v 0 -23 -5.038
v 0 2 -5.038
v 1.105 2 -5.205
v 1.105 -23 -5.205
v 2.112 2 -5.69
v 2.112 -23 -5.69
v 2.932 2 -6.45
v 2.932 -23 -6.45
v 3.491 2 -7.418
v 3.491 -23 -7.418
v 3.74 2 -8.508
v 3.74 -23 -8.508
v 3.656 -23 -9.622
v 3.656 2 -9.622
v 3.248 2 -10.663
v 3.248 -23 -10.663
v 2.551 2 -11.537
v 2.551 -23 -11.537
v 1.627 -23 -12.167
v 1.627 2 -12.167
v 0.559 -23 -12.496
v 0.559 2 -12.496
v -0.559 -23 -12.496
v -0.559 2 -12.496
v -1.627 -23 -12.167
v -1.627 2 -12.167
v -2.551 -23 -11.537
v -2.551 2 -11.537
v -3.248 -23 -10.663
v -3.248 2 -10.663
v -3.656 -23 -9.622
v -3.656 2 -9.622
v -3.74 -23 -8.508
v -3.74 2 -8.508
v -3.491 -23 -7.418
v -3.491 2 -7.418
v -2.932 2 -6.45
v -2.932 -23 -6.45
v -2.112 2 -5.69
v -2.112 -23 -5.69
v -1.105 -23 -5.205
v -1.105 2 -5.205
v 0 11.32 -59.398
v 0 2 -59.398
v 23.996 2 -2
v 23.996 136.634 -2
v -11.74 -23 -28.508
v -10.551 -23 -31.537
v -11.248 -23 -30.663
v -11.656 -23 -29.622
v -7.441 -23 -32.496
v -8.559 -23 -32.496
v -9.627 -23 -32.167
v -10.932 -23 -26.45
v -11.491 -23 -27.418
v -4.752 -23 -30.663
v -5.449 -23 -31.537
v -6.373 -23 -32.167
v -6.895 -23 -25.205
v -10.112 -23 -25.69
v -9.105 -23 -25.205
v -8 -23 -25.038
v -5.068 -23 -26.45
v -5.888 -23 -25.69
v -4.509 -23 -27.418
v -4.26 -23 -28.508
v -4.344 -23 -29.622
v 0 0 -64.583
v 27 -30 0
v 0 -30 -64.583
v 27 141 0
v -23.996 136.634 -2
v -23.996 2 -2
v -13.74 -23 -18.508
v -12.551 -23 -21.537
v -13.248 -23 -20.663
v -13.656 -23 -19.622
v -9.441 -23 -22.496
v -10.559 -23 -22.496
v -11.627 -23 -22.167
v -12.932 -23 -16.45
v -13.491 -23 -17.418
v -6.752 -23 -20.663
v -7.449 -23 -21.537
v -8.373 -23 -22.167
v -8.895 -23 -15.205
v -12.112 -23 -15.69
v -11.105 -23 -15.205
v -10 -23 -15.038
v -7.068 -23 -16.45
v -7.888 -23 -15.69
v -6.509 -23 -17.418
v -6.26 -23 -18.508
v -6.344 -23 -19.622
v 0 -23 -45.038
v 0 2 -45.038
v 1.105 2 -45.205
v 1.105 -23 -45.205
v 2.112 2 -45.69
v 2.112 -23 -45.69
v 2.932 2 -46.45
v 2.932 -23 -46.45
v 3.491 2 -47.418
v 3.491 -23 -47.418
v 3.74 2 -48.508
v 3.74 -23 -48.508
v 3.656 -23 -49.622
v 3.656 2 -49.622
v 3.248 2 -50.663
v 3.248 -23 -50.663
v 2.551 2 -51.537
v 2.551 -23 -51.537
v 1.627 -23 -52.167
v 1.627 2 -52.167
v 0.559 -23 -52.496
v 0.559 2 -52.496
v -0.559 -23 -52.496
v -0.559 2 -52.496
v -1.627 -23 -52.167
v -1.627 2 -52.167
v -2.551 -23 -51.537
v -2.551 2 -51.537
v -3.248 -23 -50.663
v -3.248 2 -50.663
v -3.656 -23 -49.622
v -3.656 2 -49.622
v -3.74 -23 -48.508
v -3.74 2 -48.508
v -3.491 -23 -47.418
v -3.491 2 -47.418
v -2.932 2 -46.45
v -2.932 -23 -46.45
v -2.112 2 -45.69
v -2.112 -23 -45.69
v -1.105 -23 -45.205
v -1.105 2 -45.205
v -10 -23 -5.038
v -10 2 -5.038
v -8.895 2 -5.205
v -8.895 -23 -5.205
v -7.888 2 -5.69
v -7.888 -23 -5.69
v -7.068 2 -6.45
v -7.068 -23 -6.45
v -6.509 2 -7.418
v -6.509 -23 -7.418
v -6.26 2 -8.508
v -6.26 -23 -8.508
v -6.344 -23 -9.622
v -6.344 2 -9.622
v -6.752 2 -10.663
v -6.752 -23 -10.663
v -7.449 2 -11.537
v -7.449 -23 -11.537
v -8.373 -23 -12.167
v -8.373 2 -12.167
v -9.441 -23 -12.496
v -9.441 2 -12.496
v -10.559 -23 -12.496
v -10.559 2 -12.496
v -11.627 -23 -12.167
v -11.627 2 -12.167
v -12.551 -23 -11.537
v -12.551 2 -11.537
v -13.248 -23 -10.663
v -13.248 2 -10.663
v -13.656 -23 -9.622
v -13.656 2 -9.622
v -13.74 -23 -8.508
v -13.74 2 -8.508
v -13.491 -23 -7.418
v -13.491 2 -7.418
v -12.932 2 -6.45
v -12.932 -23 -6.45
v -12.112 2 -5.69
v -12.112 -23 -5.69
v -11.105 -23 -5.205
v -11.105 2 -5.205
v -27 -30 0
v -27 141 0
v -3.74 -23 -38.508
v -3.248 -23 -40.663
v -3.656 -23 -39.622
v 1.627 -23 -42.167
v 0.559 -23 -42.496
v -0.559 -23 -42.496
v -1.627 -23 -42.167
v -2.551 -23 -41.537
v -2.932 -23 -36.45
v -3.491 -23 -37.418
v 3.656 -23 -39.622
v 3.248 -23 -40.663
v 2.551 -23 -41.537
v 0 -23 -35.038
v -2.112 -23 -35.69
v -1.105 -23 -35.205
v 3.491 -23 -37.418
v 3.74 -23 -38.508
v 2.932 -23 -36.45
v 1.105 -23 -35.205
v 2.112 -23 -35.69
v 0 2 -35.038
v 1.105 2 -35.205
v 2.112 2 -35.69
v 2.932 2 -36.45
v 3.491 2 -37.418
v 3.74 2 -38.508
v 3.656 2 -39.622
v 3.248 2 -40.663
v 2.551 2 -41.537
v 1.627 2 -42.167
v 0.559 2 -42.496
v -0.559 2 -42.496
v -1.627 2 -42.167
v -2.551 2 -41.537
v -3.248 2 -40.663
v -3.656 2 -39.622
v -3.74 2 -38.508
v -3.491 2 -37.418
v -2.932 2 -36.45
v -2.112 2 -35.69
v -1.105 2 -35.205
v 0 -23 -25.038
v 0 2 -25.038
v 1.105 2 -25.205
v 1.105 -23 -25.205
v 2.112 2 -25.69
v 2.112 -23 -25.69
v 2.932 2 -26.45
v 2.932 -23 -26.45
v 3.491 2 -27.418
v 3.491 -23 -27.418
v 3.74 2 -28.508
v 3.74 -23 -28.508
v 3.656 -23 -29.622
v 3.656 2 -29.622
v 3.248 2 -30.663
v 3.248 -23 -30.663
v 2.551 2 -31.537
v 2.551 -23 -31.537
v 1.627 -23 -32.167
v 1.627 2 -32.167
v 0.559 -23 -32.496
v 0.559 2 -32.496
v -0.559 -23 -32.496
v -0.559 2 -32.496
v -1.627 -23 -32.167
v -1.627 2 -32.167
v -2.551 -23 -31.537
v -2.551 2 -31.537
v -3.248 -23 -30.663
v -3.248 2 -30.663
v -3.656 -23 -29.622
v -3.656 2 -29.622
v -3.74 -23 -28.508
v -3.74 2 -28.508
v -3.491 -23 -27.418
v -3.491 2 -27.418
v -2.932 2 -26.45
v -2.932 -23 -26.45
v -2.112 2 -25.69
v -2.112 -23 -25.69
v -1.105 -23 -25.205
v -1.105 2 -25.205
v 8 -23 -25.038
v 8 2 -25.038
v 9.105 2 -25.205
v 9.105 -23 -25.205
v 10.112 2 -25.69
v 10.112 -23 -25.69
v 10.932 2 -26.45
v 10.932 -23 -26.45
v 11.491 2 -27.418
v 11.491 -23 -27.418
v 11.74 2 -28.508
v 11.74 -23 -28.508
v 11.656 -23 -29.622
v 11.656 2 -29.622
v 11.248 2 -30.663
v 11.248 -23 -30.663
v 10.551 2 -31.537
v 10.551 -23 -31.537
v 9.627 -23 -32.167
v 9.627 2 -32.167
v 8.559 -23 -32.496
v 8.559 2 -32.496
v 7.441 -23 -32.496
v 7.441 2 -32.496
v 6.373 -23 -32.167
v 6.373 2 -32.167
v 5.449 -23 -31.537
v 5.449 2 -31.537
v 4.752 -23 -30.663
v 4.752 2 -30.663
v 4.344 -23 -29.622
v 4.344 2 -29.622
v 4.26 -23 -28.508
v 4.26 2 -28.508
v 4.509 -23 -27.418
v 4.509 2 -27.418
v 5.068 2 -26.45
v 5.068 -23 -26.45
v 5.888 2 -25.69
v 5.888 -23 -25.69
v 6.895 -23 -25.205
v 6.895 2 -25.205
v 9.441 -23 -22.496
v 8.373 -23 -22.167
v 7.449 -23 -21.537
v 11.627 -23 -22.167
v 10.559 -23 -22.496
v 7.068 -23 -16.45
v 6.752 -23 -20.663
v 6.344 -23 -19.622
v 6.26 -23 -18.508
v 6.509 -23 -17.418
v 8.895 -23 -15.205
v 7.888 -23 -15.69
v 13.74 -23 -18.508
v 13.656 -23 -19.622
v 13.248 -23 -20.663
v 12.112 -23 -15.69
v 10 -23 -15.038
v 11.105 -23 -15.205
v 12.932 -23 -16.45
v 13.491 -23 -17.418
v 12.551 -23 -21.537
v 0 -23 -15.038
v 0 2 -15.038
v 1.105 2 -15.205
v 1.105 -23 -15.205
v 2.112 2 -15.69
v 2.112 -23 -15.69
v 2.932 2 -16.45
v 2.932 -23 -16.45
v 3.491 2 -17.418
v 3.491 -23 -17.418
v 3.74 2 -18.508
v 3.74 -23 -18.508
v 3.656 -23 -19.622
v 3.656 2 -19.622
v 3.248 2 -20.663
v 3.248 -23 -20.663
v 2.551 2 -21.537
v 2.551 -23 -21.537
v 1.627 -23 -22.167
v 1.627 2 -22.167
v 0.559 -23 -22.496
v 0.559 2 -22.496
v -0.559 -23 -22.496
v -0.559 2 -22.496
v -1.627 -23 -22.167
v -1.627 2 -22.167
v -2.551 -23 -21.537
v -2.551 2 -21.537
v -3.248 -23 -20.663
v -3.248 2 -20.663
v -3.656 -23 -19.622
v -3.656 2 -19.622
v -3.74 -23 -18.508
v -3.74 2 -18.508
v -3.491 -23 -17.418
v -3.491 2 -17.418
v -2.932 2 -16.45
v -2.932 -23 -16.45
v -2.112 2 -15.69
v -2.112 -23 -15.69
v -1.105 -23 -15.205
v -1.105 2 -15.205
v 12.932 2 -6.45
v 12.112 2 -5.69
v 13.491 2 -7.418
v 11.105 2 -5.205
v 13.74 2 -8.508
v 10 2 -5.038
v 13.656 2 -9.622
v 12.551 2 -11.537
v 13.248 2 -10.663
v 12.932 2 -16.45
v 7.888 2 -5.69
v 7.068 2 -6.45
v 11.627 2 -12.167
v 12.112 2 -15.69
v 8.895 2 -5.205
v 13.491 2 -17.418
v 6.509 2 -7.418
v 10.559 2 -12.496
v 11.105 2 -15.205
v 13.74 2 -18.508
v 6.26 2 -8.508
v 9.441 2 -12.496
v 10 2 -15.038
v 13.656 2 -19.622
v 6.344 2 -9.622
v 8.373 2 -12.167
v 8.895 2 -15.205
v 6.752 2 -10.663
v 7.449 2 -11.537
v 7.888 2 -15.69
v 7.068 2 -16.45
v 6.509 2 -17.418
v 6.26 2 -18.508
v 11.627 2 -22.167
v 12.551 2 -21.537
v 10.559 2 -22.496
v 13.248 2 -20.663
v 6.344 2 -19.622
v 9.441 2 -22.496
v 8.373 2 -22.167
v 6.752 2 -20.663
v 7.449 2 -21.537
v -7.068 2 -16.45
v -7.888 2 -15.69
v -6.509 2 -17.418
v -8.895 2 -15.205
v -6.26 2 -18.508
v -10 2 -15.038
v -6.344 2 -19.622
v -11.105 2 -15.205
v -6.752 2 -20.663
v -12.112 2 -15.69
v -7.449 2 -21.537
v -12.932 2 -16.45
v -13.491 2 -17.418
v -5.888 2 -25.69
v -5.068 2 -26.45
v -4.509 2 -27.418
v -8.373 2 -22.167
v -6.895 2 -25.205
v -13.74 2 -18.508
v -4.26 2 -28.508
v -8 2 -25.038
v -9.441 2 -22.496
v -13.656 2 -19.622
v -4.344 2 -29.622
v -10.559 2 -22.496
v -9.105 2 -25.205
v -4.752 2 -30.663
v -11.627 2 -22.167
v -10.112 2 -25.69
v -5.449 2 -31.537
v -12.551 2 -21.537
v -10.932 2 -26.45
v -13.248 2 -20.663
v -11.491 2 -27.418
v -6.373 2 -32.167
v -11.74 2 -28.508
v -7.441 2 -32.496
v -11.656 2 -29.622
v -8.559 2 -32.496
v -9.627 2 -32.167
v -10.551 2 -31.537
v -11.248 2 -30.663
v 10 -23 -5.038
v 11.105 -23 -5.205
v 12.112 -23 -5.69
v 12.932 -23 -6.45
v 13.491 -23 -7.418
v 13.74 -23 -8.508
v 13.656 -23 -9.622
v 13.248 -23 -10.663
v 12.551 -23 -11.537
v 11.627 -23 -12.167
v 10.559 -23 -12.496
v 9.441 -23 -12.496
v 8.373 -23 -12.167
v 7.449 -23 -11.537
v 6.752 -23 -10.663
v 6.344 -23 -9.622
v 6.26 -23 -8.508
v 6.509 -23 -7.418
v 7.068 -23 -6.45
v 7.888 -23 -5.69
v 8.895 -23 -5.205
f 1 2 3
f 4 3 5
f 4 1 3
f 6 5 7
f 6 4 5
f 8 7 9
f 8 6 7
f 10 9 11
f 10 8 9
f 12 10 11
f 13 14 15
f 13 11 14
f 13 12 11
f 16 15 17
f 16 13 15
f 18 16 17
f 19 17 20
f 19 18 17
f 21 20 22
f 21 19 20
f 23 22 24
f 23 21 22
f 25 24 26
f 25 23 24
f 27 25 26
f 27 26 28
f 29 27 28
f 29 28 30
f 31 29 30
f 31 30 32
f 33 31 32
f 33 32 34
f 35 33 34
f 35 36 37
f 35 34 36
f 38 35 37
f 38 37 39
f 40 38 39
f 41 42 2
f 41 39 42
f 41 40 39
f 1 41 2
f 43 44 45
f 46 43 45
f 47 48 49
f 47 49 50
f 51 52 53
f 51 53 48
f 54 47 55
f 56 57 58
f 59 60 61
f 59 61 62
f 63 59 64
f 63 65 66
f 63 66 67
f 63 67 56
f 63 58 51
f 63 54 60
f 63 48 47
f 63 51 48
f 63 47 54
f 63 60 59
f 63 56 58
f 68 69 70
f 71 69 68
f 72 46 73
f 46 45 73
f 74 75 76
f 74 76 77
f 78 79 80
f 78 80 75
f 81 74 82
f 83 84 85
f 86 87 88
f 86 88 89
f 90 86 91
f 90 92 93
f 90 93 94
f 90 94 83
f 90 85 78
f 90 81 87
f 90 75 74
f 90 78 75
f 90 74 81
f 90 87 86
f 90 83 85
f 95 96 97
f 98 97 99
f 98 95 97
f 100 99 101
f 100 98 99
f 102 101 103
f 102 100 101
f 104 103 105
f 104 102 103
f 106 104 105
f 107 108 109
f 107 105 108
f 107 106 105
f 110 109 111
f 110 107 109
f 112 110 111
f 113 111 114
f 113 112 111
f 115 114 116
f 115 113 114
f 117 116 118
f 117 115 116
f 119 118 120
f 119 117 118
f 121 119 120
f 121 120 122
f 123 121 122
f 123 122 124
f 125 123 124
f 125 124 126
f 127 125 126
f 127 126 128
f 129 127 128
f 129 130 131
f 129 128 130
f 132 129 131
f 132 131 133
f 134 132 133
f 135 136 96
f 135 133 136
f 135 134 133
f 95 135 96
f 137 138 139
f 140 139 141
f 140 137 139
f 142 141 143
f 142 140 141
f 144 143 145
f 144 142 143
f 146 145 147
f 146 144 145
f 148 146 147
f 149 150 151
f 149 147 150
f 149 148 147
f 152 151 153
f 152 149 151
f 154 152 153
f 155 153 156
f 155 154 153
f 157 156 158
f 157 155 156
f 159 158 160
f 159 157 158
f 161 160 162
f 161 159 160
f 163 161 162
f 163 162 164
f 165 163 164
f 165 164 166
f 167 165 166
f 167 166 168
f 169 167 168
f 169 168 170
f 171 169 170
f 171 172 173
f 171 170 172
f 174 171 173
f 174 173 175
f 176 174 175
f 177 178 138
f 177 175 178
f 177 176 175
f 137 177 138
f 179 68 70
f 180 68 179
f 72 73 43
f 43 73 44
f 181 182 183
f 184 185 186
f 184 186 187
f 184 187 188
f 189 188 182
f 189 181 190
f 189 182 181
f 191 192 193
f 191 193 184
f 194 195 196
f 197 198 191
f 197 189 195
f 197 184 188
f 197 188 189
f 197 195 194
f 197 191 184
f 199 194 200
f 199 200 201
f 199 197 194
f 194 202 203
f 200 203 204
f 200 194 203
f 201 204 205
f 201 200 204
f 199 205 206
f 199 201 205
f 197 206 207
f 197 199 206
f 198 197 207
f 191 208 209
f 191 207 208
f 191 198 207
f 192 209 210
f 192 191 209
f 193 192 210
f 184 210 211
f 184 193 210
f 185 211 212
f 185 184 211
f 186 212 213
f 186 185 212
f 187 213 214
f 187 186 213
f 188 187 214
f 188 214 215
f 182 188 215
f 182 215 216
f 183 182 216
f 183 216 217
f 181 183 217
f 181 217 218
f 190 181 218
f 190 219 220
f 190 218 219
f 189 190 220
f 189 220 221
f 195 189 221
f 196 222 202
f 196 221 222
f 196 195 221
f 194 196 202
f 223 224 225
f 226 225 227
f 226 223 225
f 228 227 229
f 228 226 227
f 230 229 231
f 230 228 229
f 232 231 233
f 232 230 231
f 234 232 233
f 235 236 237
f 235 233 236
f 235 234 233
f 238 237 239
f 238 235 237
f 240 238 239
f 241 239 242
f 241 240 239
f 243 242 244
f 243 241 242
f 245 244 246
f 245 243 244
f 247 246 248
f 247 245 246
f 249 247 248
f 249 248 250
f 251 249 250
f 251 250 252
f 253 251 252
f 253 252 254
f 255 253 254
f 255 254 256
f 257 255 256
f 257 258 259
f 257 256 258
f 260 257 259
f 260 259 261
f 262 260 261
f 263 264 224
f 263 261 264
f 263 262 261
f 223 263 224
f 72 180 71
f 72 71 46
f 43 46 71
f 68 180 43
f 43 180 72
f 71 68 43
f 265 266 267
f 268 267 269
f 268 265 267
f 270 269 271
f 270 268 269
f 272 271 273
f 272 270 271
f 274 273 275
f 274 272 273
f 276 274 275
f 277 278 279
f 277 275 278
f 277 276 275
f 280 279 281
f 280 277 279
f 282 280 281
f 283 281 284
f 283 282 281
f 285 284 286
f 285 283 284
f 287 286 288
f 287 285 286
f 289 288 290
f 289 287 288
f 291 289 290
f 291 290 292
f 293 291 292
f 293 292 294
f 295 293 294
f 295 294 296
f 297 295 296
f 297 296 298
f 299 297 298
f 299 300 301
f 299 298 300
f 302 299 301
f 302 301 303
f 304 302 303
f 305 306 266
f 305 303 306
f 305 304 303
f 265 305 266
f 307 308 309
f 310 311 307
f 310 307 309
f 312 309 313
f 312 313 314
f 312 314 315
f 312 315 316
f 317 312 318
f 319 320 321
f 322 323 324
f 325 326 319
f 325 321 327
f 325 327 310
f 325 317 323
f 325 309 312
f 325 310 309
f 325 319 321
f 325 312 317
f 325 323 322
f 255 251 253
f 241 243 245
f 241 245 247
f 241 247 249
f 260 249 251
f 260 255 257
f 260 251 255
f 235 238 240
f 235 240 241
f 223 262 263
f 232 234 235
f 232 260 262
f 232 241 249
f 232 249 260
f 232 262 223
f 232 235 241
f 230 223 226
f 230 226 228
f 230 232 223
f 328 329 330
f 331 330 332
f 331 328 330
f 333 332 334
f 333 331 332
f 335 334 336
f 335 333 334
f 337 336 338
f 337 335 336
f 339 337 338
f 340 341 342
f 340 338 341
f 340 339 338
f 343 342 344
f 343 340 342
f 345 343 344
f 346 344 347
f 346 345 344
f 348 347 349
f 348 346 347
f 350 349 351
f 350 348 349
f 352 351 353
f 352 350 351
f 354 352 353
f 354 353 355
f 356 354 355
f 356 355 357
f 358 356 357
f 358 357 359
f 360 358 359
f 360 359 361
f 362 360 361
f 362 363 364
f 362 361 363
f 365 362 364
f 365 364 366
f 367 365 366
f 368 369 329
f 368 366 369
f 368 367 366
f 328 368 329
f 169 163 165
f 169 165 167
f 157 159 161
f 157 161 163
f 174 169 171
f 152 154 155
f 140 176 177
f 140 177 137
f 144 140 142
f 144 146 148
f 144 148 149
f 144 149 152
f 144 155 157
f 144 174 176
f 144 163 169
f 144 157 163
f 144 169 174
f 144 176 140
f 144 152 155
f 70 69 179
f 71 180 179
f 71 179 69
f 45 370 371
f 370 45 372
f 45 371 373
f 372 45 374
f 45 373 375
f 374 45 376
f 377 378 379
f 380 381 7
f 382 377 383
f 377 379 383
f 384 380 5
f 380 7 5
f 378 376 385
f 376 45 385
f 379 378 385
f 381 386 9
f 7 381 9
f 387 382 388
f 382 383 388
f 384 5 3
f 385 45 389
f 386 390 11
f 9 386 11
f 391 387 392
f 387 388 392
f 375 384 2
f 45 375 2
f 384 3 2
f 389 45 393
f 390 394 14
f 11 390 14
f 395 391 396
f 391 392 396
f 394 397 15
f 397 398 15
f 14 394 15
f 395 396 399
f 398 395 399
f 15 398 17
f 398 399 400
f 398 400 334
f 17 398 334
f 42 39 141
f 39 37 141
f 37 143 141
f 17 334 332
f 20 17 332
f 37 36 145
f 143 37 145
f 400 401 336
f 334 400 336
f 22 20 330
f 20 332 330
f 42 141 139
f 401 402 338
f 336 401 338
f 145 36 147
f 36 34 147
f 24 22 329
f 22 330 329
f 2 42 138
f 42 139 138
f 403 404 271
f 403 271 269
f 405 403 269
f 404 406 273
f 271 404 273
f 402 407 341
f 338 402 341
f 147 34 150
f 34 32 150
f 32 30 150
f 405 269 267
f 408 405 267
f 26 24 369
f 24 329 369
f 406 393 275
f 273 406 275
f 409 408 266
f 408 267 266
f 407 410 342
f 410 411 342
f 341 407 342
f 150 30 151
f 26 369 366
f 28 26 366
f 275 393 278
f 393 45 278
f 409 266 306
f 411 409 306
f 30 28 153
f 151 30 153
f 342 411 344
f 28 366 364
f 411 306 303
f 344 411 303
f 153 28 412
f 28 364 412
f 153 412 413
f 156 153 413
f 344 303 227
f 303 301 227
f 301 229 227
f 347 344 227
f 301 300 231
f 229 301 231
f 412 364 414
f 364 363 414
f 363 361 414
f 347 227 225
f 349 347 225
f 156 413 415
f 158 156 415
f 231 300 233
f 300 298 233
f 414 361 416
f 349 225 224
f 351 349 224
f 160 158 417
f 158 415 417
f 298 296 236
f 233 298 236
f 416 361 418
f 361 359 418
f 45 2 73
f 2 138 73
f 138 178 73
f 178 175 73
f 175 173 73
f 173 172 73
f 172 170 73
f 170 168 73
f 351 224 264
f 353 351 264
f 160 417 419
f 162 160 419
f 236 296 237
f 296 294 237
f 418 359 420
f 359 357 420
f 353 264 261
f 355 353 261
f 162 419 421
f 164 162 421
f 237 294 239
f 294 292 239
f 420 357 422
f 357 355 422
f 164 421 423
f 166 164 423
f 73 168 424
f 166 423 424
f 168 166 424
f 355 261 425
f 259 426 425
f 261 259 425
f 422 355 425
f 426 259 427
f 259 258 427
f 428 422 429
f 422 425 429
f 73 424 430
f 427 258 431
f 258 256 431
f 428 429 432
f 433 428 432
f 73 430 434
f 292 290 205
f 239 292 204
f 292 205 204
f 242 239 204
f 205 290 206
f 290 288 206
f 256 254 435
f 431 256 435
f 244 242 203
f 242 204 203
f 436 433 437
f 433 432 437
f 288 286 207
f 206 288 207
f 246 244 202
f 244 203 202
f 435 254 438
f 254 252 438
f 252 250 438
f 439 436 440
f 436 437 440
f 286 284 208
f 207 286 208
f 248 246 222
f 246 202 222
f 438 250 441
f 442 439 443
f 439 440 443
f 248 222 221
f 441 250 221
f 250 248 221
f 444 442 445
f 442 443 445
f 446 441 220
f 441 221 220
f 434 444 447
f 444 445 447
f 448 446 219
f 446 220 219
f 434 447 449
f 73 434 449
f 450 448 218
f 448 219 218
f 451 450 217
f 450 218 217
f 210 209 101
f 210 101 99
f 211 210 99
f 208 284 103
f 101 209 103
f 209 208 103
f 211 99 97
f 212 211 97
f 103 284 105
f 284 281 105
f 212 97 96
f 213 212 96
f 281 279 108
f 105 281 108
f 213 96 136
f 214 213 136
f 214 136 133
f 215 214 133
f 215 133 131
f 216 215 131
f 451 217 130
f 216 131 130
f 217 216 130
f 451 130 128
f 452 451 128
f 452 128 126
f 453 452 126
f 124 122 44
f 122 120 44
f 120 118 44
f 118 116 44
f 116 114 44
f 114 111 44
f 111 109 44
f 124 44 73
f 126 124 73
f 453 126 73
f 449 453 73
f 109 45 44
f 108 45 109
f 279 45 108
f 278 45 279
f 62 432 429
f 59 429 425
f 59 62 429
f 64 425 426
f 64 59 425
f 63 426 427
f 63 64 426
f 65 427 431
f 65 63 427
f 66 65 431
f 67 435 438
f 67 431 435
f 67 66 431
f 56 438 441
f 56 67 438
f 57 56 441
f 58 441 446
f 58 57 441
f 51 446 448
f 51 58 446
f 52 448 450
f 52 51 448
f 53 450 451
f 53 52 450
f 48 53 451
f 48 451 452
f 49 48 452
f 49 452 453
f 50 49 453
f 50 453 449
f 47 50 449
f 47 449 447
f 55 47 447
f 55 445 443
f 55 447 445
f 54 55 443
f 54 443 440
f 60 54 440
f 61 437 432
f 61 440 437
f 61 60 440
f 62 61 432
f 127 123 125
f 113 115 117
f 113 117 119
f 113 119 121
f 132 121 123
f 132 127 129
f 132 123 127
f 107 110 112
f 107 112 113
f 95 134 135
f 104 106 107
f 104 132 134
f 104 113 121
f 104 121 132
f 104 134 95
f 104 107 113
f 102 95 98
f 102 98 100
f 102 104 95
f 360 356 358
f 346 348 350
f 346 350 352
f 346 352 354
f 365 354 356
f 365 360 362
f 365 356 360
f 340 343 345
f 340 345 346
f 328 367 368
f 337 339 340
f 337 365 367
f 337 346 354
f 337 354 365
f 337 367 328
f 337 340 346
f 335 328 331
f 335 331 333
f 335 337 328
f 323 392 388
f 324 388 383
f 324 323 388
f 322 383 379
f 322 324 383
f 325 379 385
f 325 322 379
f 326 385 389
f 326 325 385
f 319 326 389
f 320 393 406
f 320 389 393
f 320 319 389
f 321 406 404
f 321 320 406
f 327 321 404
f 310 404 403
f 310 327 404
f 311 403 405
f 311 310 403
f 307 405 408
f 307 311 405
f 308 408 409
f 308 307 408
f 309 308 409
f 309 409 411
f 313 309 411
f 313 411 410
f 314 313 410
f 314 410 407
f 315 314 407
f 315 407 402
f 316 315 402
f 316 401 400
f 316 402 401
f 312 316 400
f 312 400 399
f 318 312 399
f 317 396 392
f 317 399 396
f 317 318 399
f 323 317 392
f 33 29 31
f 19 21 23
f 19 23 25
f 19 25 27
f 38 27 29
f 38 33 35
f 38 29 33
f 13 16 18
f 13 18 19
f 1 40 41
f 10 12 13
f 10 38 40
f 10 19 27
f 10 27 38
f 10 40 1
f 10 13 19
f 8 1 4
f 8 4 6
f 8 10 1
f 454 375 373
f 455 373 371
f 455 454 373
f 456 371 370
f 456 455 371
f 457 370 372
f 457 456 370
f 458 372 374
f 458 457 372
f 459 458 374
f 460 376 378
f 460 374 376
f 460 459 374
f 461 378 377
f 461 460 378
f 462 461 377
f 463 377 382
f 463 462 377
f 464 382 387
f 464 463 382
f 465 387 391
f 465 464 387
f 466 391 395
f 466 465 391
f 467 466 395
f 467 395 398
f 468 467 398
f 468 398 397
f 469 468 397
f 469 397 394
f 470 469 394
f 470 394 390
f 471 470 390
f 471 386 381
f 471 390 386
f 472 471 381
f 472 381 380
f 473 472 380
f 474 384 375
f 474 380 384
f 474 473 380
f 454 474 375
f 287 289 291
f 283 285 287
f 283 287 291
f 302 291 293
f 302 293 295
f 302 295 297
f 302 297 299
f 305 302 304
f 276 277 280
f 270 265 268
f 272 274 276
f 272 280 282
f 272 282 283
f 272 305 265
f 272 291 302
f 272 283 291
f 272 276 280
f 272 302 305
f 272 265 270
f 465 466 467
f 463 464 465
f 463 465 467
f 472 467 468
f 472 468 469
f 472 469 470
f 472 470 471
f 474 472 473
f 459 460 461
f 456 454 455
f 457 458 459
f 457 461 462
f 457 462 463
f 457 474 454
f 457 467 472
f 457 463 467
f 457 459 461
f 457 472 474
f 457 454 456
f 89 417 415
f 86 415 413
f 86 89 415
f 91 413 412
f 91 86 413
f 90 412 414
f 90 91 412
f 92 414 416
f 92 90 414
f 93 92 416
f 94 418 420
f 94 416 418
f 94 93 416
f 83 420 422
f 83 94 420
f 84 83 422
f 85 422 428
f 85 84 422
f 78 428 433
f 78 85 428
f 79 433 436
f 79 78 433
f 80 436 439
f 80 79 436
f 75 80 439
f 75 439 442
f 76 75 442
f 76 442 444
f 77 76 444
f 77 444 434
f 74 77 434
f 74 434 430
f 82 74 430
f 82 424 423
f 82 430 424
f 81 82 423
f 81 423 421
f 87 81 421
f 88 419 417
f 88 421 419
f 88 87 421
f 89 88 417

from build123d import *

# Parameters (mm, degrees)
SALIENTE_EXTRUIR1_DEPTH    = 172
VACIADO2_T                 = -2
SALIENTE_EXTRUIR2_DEPTH    = 30
CORTAR_EXTRUIR2_DEPTH      = 186.698680663
CORTAR_EXTRUIR2_DEPTH_BACK = 186.698680663
CORTAR_EXTRUIR3_DEPTH      = 184.847763109
CORTAR_EXTRUIR3_DEPTH_BACK = 25
CROQUIS8_R                 = 3.75
CORTAR_EXTRUIR4_DEPTH      = 186.698680663
CORTAR_EXTRUIR4_DEPTH_BACK = 186.698680663
CROQUIS9_W                 = 61.645841287
CROQUIS9_H                 = 31
CORTAR_EXTRUIR5_DEPTH      = 158.419820861
CORTAR_EXTRUIR5_DEPTH_BACK = 158.419820861


with BuildPart() as part:
    # Croquis1 → Saliente-Extruir1 (new body)
    with BuildSketch(Plane(origin=(0, 0, 0), x_dir=(1, 0, 0), z_dir=(0, 1, 0))):
        Polygon((27, 0), (-27, 0), (0, 64.58327957), align=None)
    extrude(amount=SALIENTE_EXTRUIR1_DEPTH)

    # Vaciado2
    vaciado2_openings = [part.faces().sort_by_distance(p)[0] for p in [
        (0, 172, -21.527759857),
    ]]
    offset(amount=VACIADO2_T, openings=vaciado2_openings, kind=Kind.INTERSECTION)

    # Croquis6 → Saliente-Extruir2 (add)
    with BuildSketch(Plane.XZ):
        Polygon((-27, 0), (27, 0), (0, -64.58327957), align=None)
    extrude(amount=SALIENTE_EXTRUIR2_DEPTH)

    # Croquis5 → Cortar-Extruir2 (cut, two sides: drawn at the far end of the back side and taken through both)
    with BuildSketch(Plane(origin=(0, 0, 0), x_dir=(0, 0, -1), z_dir=(1, 0, 0)).offset(-CORTAR_EXTRUIR2_DEPTH_BACK)):
        Polygon((4.522801595, 172), (64.58327957, 172), (64.58327957, 0), align=None)
    extrude(amount=CORTAR_EXTRUIR2_DEPTH + CORTAR_EXTRUIR2_DEPTH_BACK, mode=Mode.SUBTRACT)

    # Croquis8 → Cortar-Extruir3 (cut, two sides: drawn at the far end of the back side and taken through both)
    with BuildSketch(Plane(origin=(0, 2, 0), x_dir=(1, 0, 0), z_dir=(0, 1, 0)).offset(-CORTAR_EXTRUIR3_DEPTH_BACK)):
        with Locations(Location((0, 48.787977385, 0), (0, 0, 270))):
            Circle(CROQUIS8_R)
        with Locations(Location((0, 38.787977385, 0), (0, 0, 270))):
            Circle(CROQUIS8_R)
        with Locations(Location((0, 28.787977385, 0), (0, 0, 270))):
            Circle(CROQUIS8_R)
        with Locations(Location((0, 18.787977385, 0), (0, 0, 270))):
            Circle(CROQUIS8_R)
        with Locations(Location((0, 8.787977385, 0), (0, 0, 270))):
            Circle(CROQUIS8_R)
        with Locations(Location((10, 8.787977385, 0), (0, 0, 270))):
            Circle(CROQUIS8_R)
        with Locations(Location((-10, 8.787977385, 0), (0, 0, 270))):
            Circle(CROQUIS8_R)
        with Locations(Location((10, 18.787977385, 0), (0, 0, 270))):
            Circle(CROQUIS8_R)
        with Locations(Location((-10, 18.787977385, 0), (0, 0, 270))):
            Circle(CROQUIS8_R)
        with Locations(Location((8, 28.787977385, 0), (0, 0, 270))):
            Circle(CROQUIS8_R)
        with Locations(Location((-8, 28.787977385, 0), (0, 0, 270))):
            Circle(CROQUIS8_R)
    extrude(amount=CORTAR_EXTRUIR3_DEPTH + CORTAR_EXTRUIR3_DEPTH_BACK, mode=Mode.SUBTRACT)

    # Croquis9 → Cortar-Extruir4 (cut, two sides: drawn at the far end of the back side and taken through both)
    with BuildSketch(Plane(origin=(0, 0, 0), x_dir=(0, 0, -1), z_dir=(1, 0, 0)).offset(-CORTAR_EXTRUIR4_DEPTH_BACK)):
        with Locations((30.822920644, 156.5)):
            Rectangle(CROQUIS9_W, CROQUIS9_H)
    extrude(amount=CORTAR_EXTRUIR4_DEPTH + CORTAR_EXTRUIR4_DEPTH_BACK, mode=Mode.SUBTRACT)

    # Croquis10 → Cortar-Extruir5 (cut, two sides: drawn at the far end of the back side and taken through both)
    with BuildSketch(Plane(origin=(0, 0, 0), x_dir=(0, 0, -1), z_dir=(1, 0, 0)).offset(-CORTAR_EXTRUIR5_DEPTH_BACK)):
        Polygon((0, 141), (64.58327957, 0), (23.73241025, 141), align=None)
    extrude(amount=CORTAR_EXTRUIR5_DEPTH + CORTAR_EXTRUIR5_DEPTH_BACK, mode=Mode.SUBTRACT)


solid = part.part
